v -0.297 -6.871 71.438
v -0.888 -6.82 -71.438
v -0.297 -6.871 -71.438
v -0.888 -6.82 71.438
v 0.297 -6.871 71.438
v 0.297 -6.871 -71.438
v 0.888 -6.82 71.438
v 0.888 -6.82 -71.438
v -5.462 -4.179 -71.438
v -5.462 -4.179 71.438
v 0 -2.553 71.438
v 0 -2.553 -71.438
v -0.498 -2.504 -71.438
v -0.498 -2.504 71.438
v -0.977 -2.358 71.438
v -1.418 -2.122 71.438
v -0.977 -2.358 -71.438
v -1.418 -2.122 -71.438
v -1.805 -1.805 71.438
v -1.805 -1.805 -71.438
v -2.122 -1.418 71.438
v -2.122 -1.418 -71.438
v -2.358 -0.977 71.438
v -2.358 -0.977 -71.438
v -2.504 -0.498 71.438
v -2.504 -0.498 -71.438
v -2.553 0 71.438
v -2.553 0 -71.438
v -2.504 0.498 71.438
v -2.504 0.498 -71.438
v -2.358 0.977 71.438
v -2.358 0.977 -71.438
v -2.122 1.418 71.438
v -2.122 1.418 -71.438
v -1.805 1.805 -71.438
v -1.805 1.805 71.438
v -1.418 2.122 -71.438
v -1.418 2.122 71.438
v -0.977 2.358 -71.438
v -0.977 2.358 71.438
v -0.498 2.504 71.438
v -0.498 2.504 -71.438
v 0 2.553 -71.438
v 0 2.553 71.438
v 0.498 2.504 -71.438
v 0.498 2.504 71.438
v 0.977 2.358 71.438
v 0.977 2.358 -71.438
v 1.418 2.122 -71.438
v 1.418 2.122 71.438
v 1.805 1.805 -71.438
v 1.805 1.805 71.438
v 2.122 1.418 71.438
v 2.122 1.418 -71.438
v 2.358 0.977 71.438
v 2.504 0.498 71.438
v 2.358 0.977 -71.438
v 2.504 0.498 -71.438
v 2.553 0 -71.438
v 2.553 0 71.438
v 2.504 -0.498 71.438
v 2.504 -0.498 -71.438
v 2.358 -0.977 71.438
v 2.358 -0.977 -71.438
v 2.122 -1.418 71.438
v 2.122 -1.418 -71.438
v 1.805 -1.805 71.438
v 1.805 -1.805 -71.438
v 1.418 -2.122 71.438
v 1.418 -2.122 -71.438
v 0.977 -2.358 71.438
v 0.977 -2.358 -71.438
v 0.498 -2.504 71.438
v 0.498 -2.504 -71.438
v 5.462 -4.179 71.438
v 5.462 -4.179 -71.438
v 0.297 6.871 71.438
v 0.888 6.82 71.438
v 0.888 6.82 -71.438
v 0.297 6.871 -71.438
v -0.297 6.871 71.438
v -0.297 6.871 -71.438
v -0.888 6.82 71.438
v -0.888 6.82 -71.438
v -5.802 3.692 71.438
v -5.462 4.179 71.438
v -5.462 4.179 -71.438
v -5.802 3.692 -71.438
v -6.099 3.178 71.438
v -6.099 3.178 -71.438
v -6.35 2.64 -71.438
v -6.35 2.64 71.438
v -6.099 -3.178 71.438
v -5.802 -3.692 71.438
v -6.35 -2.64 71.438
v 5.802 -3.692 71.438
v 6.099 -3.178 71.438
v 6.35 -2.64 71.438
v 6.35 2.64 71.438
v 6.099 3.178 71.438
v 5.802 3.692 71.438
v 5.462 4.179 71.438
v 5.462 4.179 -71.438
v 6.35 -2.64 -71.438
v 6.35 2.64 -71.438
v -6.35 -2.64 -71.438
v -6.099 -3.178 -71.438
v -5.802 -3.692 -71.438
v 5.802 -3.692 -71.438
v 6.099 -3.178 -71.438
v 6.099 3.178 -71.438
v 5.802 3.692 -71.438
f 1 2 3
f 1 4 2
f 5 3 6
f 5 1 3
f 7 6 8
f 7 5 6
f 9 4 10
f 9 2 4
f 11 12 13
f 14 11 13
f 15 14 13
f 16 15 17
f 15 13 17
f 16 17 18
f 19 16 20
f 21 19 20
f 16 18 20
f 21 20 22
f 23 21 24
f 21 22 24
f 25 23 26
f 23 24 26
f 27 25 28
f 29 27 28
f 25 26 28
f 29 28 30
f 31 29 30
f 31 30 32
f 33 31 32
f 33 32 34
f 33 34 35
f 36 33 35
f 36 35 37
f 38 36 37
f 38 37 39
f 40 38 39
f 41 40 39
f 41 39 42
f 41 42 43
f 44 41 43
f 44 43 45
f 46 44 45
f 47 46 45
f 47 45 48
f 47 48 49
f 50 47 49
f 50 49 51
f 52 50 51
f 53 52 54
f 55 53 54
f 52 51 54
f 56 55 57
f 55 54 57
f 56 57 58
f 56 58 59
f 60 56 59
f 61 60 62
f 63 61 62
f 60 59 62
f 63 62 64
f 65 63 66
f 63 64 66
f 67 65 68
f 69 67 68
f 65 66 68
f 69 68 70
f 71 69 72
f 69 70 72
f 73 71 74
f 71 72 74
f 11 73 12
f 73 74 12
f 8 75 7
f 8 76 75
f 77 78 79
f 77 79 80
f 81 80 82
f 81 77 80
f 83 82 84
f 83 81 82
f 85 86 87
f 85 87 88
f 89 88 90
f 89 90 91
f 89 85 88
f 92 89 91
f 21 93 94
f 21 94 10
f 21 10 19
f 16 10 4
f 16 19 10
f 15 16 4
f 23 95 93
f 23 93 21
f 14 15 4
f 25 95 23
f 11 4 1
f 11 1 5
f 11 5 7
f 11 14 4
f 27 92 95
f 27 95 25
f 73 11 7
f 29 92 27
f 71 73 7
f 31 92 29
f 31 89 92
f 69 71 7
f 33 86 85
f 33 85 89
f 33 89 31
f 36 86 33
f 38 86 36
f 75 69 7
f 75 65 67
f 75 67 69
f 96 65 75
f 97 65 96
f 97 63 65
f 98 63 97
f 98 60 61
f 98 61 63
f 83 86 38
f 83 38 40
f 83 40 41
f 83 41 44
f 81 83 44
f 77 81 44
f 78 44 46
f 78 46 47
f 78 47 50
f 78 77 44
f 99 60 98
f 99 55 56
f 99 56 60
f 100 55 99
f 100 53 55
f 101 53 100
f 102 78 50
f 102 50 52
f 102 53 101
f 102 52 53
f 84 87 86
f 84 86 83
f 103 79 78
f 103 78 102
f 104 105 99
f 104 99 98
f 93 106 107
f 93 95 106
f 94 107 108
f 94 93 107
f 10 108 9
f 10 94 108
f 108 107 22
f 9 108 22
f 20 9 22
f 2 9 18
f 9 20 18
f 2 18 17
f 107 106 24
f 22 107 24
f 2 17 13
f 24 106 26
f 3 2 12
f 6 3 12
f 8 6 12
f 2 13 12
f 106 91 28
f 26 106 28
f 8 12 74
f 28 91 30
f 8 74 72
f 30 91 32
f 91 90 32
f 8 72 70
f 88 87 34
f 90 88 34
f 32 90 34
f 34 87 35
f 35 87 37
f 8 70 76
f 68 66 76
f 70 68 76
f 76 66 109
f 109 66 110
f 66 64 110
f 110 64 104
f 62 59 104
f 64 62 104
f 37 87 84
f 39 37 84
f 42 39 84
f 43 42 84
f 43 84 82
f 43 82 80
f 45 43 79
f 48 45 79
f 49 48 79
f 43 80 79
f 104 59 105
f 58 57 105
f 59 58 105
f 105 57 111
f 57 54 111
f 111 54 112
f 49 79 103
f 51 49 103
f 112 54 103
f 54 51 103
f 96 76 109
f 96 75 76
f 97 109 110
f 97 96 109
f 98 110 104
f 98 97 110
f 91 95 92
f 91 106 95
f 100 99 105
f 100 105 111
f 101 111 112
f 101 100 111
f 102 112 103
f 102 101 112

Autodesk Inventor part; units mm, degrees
ref_plane "YZ Plane" through (0, 0, 0) normal (1, 0, 0) x (0, 1, 0)
ref_plane "XZ Plane" through (0, 0, 0) normal (0, 1, 0) x (-1, 0, 0)
ref_plane "XY Plane" through (0, 0, 0) normal (0, 0, 1) x (1, 0, 0)
sketch "Sketch1" plane through (0, 0, 0) normal (0, 0, 1) x (1, 0, 0)
  line L0 (-6.35, -3.6662) -> (-6.35, 3.6662)
  line L1 (-6.35, 3.6662) -> (0, 7.3323)
  line L2 (0, 7.3323) -> (6.35, 3.6662)
  line L3 (6.35, 3.6662) -> (6.35, -3.6662)
  line L4 (6.35, -3.6662) -> (0, -7.3323)
  line L5 (0, -7.3323) -> (-6.35, -3.6662)
  point P0 (0, 0)
  point P1 (0, 0)
  dimension "Size" = 12.7
extrude "Extrusion1" add sketch "Sketch1" along normal mid plane 142.875
sketch "Sketch3" plane through (0, 0, 71.4375) normal (0, 0, 1) x (1, 0, 0)
  line L0 (-6.35, 3.6662) -> (0, 7.3323) construction
  line L1 (0, 7.3323) -> (6.35, 3.6662) construction
  line L2 (6.35, 3.6662) -> (6.35, -3.6662) construction
  line L3 (6.35, -3.6662) -> (0, -7.3323) construction
  line L4 (0, -7.3323) -> (-6.35, -3.6662) construction
  line L5 (-6.35, -3.6662) -> (-6.35, 3.6662) construction
  point P0 (0, 0)
hole "Hole1" at (0, 0, 71.4375) direction (0, 0, -1) diameter 5.1054 end through all
sketch "Sketch4" plane through (0, 0, 71.4375) normal (0, 0, 1) x (1, 0, 0)
  circle A0 centre (0, 0) radius 2.5527 construction
  line L0 (-6.35, 3.6662) -> (0, 7.3323) construction
  line L1 (0, 7.3323) -> (6.35, 3.6662) construction
  line L2 (6.35, 3.6662) -> (6.35, -3.6662) construction
  line L3 (6.35, -3.6662) -> (0, -7.3323) construction
  line L4 (0, -7.3323) -> (-6.35, -3.6662) construction
  line L5 (-6.35, -3.6662) -> (-6.35, 3.6662) construction
  circle A1 centre (0, 0) radius 6.8771
  circle A2 centre (0, 0) radius 8.89
  dimension "thunder" = 13.7541
  dimension "d16" = 17.78
extrude "Extrusion3" cut sketch "Sketch4" against normal through all
equation "\"bearing\" = 25.4"
properties part number "GP4-010" material "Aluminum 6061"
